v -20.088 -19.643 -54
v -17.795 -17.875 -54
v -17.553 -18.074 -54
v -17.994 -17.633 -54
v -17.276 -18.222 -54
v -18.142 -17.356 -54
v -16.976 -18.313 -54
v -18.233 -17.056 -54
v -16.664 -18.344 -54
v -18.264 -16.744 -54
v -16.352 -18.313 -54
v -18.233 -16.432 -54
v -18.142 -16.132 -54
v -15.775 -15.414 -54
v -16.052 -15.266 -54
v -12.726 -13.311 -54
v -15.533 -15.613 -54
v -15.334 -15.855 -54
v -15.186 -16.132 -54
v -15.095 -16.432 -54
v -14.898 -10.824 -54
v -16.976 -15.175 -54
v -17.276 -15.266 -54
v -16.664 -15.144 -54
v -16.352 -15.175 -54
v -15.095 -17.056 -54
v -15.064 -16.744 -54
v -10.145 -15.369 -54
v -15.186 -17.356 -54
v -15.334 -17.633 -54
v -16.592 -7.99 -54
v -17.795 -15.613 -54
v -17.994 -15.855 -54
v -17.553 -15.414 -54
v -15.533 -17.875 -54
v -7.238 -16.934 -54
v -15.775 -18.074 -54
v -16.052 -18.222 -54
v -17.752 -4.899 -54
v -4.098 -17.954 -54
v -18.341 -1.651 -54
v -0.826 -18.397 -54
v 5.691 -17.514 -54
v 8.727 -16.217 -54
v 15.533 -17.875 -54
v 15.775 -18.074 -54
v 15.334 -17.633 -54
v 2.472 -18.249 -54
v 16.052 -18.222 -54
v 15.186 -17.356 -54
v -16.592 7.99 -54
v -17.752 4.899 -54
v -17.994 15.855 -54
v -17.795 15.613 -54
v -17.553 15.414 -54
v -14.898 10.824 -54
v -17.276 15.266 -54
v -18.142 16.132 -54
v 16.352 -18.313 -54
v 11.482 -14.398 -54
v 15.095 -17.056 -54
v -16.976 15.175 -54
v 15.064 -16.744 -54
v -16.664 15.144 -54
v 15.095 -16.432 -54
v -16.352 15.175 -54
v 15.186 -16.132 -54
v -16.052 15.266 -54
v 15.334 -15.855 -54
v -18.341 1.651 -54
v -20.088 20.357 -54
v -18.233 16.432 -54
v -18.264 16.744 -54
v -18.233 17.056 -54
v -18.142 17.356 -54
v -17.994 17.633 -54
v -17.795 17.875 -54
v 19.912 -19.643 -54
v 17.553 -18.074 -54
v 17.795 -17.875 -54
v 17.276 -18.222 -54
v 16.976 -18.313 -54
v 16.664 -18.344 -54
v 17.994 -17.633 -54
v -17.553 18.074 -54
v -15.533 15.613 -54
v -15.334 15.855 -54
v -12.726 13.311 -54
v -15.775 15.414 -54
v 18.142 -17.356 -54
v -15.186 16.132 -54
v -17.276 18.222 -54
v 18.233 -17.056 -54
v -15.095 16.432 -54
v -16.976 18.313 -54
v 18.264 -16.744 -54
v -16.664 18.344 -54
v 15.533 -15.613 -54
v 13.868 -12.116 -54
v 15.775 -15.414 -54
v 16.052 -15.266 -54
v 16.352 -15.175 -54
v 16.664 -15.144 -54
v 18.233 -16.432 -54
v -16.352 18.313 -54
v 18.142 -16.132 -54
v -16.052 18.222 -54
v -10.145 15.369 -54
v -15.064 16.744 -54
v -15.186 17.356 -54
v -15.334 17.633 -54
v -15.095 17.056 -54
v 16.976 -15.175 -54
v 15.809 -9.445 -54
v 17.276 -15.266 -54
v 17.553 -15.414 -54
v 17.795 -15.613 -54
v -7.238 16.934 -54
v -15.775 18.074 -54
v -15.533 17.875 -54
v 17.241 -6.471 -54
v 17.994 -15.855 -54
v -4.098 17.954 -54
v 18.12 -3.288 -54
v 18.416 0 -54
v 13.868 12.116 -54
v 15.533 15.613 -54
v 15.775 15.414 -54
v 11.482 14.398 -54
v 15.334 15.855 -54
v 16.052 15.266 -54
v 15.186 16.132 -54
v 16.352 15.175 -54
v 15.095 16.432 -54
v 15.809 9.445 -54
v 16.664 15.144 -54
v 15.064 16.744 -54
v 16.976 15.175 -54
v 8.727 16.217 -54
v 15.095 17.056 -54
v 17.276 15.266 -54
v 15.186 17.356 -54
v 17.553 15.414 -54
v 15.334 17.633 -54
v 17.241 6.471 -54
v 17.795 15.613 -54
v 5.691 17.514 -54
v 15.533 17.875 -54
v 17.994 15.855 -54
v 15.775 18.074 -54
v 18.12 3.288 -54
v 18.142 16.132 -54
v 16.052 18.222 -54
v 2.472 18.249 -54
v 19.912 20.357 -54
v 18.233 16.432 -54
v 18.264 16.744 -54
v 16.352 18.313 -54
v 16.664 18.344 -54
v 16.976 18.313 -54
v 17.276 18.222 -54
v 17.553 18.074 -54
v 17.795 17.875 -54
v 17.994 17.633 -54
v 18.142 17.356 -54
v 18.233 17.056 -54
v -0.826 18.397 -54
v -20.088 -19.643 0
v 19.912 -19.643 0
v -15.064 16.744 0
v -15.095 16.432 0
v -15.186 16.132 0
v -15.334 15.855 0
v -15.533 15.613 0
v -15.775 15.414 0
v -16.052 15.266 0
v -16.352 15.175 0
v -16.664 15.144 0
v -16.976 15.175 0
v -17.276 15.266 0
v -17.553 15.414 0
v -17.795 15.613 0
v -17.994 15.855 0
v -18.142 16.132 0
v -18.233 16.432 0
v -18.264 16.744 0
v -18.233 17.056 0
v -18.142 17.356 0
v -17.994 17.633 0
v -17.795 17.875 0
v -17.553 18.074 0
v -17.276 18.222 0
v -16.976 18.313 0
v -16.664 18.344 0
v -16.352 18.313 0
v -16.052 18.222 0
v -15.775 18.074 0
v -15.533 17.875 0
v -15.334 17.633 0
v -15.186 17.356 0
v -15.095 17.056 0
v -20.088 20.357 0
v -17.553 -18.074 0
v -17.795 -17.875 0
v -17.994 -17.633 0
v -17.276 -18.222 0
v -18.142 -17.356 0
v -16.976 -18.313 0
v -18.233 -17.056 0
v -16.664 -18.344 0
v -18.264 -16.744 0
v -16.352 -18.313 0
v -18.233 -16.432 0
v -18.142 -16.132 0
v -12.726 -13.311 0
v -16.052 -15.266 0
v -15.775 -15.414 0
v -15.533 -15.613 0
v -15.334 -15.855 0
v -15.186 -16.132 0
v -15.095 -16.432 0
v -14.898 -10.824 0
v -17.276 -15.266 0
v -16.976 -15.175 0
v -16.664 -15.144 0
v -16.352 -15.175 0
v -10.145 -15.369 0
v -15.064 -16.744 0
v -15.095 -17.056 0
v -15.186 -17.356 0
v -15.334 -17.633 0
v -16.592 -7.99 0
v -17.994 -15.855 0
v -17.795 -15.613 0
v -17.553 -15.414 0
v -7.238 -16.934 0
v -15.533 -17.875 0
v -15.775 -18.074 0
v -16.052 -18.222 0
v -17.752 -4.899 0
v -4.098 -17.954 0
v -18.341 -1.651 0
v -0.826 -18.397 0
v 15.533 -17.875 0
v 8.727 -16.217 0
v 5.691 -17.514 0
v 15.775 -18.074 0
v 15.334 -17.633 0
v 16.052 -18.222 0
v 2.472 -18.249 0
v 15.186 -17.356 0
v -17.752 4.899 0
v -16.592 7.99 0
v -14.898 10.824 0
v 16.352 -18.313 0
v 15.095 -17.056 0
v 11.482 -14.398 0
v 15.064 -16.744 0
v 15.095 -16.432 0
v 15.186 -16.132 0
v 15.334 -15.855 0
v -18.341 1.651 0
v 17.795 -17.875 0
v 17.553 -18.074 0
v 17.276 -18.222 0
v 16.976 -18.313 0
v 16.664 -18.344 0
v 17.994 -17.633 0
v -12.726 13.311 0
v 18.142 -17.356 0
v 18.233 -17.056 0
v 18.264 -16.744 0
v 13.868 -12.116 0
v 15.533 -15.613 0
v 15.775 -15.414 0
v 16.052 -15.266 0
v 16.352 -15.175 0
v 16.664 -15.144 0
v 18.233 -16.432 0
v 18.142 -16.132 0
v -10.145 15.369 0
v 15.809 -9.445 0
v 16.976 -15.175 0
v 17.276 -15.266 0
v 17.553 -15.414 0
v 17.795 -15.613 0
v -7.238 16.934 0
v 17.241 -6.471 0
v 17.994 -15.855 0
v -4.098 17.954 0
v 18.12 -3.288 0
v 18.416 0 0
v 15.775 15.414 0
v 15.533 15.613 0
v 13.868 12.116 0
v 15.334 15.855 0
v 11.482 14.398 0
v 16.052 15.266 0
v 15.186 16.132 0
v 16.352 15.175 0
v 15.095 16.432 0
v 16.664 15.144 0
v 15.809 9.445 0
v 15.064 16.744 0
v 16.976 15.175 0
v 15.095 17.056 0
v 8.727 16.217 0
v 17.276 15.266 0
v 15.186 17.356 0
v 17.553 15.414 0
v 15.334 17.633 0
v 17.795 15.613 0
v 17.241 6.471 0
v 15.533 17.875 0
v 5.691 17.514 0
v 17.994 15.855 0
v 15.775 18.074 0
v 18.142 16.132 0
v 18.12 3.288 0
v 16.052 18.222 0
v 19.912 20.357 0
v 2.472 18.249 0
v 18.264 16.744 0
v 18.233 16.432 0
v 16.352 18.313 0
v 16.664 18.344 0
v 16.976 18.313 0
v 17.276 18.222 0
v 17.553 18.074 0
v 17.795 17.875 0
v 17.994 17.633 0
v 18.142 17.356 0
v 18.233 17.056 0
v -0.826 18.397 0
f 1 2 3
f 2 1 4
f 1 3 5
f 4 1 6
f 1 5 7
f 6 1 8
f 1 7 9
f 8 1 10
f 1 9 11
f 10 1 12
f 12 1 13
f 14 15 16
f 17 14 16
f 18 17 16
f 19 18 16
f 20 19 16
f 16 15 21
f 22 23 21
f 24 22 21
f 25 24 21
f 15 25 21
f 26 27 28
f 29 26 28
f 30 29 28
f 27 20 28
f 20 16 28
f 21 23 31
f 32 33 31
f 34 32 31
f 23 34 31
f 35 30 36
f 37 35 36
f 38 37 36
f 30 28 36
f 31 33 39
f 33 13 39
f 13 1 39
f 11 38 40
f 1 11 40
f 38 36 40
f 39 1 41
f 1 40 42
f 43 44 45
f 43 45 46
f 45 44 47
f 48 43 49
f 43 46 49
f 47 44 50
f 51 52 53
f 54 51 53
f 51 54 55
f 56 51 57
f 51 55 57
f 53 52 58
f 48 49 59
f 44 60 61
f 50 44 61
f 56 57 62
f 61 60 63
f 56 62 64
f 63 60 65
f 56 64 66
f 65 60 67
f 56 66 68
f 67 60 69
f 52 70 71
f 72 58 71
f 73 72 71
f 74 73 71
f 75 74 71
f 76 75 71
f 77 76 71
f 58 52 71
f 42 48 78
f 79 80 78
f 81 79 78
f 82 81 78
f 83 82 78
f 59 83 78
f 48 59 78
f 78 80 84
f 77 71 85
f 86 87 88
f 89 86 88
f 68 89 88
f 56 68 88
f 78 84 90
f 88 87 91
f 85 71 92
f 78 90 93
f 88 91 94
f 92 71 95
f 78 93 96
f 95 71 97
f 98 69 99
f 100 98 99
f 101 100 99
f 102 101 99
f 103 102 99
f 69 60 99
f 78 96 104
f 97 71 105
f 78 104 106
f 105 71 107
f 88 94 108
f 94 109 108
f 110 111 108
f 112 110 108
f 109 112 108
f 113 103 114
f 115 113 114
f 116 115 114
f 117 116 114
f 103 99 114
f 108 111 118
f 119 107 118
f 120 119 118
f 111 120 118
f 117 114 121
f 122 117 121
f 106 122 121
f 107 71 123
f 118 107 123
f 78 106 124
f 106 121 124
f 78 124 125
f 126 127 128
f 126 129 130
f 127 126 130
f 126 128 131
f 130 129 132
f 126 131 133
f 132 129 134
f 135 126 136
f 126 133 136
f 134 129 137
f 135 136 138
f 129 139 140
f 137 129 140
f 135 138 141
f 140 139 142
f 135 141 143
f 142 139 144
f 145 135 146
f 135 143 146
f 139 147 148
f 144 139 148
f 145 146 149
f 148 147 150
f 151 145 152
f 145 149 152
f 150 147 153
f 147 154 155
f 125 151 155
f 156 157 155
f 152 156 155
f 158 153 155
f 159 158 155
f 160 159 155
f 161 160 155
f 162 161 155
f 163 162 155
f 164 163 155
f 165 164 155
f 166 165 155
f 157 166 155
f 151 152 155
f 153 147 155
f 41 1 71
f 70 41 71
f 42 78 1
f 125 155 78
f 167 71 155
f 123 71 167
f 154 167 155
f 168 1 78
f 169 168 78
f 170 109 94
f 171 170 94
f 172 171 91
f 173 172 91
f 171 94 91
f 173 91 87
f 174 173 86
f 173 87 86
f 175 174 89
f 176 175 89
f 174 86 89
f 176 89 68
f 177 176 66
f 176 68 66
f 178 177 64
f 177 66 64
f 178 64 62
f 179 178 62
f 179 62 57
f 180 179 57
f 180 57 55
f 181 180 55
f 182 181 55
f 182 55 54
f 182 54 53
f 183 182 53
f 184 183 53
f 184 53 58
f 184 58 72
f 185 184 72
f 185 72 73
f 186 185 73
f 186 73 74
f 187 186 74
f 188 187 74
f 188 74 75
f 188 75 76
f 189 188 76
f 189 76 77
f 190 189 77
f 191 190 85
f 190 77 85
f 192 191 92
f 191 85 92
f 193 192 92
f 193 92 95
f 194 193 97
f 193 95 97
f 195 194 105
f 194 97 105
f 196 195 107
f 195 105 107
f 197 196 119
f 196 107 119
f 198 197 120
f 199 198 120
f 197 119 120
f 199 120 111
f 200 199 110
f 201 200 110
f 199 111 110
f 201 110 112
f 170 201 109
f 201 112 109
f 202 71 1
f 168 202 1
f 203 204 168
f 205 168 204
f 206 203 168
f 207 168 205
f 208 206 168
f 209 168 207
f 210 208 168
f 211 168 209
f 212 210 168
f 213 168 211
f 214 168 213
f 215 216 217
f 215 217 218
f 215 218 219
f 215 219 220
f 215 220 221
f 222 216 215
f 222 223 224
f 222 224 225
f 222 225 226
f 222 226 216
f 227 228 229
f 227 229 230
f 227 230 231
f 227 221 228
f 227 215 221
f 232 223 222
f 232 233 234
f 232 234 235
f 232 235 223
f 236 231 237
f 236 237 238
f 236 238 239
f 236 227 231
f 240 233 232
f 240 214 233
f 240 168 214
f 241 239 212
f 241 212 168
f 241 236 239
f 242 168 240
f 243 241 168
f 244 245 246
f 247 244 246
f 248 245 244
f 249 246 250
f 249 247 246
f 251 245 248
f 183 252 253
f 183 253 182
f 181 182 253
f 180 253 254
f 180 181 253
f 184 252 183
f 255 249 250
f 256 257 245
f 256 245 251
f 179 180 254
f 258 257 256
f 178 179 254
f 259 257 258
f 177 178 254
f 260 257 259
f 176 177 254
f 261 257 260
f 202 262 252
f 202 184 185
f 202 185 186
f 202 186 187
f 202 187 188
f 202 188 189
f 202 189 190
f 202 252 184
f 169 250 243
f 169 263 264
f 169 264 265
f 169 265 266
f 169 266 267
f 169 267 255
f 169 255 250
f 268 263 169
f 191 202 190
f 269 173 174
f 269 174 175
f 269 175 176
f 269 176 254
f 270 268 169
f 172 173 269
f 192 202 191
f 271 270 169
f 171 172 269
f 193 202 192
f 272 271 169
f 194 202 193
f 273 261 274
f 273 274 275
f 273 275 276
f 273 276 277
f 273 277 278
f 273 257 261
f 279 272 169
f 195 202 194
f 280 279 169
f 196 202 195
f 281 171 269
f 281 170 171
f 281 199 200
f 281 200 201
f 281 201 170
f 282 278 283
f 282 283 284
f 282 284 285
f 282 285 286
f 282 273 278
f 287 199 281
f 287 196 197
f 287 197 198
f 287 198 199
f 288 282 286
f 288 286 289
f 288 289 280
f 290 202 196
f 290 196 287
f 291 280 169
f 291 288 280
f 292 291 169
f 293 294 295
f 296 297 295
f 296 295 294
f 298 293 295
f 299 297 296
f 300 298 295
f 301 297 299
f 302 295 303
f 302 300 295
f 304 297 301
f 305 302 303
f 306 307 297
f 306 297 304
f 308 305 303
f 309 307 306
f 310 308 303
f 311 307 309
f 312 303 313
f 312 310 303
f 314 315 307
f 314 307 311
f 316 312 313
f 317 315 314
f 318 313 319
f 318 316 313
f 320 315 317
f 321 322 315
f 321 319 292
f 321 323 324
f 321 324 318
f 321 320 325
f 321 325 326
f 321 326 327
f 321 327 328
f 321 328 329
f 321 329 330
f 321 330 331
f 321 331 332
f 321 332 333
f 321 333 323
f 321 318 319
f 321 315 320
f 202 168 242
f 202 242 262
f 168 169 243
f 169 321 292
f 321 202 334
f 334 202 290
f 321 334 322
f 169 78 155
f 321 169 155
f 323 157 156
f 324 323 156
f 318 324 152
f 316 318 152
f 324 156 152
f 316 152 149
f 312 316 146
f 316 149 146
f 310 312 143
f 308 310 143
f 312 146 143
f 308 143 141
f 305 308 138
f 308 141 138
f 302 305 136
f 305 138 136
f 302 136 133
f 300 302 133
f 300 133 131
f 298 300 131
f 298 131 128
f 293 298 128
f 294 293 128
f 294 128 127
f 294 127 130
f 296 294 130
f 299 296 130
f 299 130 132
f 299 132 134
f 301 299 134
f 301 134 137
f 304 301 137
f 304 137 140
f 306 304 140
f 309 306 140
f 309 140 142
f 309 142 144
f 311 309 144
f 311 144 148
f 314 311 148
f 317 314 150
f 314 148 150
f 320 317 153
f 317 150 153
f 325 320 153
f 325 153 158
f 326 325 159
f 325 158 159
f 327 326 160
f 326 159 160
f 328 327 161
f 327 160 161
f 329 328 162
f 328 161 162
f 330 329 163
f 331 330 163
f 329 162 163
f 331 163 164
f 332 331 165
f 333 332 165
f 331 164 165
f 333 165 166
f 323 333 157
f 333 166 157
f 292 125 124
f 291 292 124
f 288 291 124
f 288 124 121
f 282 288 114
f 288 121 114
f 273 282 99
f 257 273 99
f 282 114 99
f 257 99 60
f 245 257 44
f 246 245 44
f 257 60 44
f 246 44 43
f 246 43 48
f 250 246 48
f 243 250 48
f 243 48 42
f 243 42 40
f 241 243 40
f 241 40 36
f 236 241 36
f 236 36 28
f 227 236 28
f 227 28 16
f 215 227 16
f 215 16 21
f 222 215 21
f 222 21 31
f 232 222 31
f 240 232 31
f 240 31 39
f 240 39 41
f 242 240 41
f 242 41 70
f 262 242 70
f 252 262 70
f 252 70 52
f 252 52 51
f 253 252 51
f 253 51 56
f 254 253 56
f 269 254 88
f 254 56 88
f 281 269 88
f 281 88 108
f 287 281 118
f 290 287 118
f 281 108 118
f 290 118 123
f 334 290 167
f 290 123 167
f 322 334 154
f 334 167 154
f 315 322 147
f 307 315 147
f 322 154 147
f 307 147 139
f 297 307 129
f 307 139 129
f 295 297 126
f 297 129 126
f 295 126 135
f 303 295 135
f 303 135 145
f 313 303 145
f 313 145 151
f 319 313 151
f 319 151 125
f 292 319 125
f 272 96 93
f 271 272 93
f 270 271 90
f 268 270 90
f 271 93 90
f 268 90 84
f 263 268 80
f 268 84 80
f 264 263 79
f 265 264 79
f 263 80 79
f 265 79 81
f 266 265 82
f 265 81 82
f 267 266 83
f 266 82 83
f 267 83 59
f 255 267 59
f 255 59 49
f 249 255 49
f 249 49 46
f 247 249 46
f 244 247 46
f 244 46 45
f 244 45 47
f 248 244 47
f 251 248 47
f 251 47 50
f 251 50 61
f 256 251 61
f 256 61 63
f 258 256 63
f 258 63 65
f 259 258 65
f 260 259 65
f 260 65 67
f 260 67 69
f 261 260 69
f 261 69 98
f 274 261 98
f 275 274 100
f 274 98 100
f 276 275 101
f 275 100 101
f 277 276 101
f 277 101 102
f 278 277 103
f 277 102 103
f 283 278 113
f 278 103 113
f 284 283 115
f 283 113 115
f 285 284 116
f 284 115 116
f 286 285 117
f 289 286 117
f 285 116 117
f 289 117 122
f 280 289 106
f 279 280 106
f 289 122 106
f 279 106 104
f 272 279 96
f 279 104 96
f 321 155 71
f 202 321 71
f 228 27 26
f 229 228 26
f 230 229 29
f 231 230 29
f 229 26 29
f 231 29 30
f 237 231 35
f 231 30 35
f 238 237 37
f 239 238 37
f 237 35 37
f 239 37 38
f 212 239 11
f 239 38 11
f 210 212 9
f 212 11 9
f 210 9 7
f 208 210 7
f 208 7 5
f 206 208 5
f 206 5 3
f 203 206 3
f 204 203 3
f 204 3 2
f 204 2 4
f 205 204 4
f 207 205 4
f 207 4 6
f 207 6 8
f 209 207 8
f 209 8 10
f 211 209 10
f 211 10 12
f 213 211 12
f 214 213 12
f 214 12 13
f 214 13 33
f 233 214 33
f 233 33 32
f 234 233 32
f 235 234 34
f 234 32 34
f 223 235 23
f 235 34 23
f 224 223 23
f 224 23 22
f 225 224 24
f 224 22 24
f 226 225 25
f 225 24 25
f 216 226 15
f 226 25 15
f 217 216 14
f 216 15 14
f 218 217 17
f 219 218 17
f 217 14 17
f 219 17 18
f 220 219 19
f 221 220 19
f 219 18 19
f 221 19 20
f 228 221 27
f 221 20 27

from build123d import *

# Parameters (mm, degrees)
F0_W   = 40
F0_H   = 40
F0_R   = 1.6
F0_R_2 = 18.4155


with BuildPart() as f2:
    # F2: sweep along a path in F1
    with BuildLine(Plane.YZ) as f2_path:
        Line((0, 0), (0, -54))
    # F0 (on Top) → F2 (sweep)
    with BuildSketch(Plane.XY):
        with Locations((-0.088266, 0.357345)):
            Rectangle(F0_W, F0_H)
        with Locations((-16.664036, -16.74399)):
            Circle(F0_R, mode=Mode.SUBTRACT)
        with Locations((16.664036, -16.74399)):
            Circle(F0_R, mode=Mode.SUBTRACT)
        Circle(F0_R_2, mode=Mode.SUBTRACT)
        with Locations((-16.664036, 16.74399)):
            Circle(F0_R, mode=Mode.SUBTRACT)
        with Locations((16.664036, 16.74399)):
            Circle(F0_R, mode=Mode.SUBTRACT)
    sweep(path=f2_path.line)


solid = f2.part
